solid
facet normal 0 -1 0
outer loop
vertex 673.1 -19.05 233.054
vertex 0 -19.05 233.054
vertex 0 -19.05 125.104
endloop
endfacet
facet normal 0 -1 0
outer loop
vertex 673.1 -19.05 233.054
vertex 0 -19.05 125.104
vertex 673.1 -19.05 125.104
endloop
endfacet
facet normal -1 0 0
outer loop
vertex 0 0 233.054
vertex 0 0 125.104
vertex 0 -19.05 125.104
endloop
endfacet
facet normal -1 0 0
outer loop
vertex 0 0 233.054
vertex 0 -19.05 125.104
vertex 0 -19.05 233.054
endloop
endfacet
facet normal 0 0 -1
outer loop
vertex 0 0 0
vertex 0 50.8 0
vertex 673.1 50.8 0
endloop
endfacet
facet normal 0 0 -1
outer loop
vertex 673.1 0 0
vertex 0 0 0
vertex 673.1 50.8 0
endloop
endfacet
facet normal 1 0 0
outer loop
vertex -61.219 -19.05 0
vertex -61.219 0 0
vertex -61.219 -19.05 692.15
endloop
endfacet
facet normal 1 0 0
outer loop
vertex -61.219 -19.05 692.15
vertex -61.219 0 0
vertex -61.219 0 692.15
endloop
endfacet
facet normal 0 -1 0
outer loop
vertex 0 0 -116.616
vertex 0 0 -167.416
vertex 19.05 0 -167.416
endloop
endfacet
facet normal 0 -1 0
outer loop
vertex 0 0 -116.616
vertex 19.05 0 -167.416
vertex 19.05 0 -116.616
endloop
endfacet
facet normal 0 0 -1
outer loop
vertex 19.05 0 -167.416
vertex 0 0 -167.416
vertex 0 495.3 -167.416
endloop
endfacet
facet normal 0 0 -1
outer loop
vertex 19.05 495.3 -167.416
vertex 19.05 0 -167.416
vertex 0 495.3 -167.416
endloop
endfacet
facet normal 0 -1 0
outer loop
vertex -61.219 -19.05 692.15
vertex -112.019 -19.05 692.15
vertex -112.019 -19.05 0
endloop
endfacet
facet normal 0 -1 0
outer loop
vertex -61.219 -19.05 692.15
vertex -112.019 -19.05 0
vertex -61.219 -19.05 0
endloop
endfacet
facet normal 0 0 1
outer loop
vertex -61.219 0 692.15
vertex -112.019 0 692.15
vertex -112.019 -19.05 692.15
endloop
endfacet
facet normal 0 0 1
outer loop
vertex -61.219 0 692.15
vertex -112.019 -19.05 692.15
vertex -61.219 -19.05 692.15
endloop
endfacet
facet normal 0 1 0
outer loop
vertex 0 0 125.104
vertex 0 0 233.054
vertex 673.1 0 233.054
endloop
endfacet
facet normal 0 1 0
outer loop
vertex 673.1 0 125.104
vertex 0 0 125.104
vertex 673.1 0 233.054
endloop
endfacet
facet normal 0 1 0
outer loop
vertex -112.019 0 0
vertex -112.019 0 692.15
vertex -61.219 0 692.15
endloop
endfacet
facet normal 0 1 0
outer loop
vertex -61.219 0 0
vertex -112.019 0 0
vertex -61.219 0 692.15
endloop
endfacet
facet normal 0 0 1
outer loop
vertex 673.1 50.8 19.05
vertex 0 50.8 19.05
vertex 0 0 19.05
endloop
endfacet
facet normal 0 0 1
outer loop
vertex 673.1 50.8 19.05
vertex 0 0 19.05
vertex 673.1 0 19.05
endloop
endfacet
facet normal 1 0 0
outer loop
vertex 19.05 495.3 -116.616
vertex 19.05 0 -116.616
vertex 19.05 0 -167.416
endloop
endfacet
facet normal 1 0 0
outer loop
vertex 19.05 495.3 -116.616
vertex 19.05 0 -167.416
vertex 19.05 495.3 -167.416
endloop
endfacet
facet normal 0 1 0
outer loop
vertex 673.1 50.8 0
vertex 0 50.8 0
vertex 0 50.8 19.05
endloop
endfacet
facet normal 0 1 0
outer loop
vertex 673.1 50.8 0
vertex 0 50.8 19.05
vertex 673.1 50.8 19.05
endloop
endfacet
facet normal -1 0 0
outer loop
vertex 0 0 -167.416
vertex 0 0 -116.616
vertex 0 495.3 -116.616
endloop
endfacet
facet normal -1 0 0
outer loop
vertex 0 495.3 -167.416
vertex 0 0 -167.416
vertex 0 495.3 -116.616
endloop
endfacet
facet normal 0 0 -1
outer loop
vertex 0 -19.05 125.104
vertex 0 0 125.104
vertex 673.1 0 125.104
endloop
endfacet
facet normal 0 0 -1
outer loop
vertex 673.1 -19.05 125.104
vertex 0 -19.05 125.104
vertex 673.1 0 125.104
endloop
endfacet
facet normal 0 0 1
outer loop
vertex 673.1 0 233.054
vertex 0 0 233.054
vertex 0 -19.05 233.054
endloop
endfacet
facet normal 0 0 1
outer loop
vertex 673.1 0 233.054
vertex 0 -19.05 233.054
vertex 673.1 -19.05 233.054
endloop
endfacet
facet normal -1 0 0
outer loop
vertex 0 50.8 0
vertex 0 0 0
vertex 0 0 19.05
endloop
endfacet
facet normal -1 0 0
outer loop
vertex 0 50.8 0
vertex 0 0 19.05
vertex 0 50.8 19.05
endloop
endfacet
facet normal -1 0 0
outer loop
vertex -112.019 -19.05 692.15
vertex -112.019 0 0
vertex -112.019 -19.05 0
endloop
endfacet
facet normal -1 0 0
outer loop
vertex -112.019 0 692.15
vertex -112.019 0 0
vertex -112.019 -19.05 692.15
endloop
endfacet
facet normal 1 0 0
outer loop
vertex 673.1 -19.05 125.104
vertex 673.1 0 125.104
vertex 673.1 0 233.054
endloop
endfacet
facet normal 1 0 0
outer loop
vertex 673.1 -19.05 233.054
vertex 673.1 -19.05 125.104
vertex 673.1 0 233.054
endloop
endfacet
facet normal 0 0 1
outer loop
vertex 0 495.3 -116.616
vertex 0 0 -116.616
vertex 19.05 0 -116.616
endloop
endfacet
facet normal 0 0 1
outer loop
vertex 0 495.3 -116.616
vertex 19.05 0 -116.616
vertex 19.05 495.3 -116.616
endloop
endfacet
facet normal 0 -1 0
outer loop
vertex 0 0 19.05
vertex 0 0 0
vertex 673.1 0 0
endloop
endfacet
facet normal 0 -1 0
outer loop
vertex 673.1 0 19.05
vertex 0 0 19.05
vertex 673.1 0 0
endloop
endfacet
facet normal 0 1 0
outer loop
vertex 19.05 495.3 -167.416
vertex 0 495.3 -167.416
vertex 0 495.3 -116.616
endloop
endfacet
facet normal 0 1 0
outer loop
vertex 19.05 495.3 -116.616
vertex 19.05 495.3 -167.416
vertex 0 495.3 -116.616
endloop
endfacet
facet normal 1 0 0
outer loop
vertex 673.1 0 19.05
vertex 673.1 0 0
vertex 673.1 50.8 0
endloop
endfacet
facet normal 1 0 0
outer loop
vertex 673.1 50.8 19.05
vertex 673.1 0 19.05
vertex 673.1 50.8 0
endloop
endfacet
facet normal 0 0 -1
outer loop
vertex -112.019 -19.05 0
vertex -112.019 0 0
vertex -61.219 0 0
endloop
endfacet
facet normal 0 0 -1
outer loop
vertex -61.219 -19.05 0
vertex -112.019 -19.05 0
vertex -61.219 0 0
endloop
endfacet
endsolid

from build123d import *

# Parameters (mm, degrees)
F0_W     = 673.1
F0_H     = 50.8
F1_DEPTH = 19.05
F2_W     = 495.3
F2_H     = 50.8
F3_DEPTH = 19.05
F4_W     = 50.8
F4_H     = 692.15
F5_DEPTH = 19.05
F6_W     = 673.1
F6_H     = 107.95
F7_DEPTH = 19.05


with BuildPart() as f1:
    # F0 (on Top) → F1 (new body)
    with BuildSketch(Plane.XY):
        with Locations((336.55, 25.4)):
            Rectangle(F0_W, F0_H)
    extrude(amount=F1_DEPTH)


with BuildPart() as f3:
    # F2 (on Right) → F3 (new body)
    with BuildSketch(Plane.YZ):
        with Locations((247.65, -142.01558)):
            Rectangle(F2_W, F2_H)
    extrude(amount=F3_DEPTH)


with BuildPart() as f5:
    # F4 (on Front) → F5 (new body)
    with BuildSketch(Plane.XZ):
        with Locations((-86.619365, 346.075)):
            Rectangle(F4_W, F4_H)
    extrude(amount=F5_DEPTH)


with BuildPart() as f7:
    # F6 (on Front) → F7 (new body)
    with BuildSketch(Plane.XZ):
        with Locations((336.55, 179.079018)):
            Rectangle(F6_W, F6_H)
    extrude(amount=F7_DEPTH)


solid = Compound([f1.part, f3.part, f5.part, f7.part])
